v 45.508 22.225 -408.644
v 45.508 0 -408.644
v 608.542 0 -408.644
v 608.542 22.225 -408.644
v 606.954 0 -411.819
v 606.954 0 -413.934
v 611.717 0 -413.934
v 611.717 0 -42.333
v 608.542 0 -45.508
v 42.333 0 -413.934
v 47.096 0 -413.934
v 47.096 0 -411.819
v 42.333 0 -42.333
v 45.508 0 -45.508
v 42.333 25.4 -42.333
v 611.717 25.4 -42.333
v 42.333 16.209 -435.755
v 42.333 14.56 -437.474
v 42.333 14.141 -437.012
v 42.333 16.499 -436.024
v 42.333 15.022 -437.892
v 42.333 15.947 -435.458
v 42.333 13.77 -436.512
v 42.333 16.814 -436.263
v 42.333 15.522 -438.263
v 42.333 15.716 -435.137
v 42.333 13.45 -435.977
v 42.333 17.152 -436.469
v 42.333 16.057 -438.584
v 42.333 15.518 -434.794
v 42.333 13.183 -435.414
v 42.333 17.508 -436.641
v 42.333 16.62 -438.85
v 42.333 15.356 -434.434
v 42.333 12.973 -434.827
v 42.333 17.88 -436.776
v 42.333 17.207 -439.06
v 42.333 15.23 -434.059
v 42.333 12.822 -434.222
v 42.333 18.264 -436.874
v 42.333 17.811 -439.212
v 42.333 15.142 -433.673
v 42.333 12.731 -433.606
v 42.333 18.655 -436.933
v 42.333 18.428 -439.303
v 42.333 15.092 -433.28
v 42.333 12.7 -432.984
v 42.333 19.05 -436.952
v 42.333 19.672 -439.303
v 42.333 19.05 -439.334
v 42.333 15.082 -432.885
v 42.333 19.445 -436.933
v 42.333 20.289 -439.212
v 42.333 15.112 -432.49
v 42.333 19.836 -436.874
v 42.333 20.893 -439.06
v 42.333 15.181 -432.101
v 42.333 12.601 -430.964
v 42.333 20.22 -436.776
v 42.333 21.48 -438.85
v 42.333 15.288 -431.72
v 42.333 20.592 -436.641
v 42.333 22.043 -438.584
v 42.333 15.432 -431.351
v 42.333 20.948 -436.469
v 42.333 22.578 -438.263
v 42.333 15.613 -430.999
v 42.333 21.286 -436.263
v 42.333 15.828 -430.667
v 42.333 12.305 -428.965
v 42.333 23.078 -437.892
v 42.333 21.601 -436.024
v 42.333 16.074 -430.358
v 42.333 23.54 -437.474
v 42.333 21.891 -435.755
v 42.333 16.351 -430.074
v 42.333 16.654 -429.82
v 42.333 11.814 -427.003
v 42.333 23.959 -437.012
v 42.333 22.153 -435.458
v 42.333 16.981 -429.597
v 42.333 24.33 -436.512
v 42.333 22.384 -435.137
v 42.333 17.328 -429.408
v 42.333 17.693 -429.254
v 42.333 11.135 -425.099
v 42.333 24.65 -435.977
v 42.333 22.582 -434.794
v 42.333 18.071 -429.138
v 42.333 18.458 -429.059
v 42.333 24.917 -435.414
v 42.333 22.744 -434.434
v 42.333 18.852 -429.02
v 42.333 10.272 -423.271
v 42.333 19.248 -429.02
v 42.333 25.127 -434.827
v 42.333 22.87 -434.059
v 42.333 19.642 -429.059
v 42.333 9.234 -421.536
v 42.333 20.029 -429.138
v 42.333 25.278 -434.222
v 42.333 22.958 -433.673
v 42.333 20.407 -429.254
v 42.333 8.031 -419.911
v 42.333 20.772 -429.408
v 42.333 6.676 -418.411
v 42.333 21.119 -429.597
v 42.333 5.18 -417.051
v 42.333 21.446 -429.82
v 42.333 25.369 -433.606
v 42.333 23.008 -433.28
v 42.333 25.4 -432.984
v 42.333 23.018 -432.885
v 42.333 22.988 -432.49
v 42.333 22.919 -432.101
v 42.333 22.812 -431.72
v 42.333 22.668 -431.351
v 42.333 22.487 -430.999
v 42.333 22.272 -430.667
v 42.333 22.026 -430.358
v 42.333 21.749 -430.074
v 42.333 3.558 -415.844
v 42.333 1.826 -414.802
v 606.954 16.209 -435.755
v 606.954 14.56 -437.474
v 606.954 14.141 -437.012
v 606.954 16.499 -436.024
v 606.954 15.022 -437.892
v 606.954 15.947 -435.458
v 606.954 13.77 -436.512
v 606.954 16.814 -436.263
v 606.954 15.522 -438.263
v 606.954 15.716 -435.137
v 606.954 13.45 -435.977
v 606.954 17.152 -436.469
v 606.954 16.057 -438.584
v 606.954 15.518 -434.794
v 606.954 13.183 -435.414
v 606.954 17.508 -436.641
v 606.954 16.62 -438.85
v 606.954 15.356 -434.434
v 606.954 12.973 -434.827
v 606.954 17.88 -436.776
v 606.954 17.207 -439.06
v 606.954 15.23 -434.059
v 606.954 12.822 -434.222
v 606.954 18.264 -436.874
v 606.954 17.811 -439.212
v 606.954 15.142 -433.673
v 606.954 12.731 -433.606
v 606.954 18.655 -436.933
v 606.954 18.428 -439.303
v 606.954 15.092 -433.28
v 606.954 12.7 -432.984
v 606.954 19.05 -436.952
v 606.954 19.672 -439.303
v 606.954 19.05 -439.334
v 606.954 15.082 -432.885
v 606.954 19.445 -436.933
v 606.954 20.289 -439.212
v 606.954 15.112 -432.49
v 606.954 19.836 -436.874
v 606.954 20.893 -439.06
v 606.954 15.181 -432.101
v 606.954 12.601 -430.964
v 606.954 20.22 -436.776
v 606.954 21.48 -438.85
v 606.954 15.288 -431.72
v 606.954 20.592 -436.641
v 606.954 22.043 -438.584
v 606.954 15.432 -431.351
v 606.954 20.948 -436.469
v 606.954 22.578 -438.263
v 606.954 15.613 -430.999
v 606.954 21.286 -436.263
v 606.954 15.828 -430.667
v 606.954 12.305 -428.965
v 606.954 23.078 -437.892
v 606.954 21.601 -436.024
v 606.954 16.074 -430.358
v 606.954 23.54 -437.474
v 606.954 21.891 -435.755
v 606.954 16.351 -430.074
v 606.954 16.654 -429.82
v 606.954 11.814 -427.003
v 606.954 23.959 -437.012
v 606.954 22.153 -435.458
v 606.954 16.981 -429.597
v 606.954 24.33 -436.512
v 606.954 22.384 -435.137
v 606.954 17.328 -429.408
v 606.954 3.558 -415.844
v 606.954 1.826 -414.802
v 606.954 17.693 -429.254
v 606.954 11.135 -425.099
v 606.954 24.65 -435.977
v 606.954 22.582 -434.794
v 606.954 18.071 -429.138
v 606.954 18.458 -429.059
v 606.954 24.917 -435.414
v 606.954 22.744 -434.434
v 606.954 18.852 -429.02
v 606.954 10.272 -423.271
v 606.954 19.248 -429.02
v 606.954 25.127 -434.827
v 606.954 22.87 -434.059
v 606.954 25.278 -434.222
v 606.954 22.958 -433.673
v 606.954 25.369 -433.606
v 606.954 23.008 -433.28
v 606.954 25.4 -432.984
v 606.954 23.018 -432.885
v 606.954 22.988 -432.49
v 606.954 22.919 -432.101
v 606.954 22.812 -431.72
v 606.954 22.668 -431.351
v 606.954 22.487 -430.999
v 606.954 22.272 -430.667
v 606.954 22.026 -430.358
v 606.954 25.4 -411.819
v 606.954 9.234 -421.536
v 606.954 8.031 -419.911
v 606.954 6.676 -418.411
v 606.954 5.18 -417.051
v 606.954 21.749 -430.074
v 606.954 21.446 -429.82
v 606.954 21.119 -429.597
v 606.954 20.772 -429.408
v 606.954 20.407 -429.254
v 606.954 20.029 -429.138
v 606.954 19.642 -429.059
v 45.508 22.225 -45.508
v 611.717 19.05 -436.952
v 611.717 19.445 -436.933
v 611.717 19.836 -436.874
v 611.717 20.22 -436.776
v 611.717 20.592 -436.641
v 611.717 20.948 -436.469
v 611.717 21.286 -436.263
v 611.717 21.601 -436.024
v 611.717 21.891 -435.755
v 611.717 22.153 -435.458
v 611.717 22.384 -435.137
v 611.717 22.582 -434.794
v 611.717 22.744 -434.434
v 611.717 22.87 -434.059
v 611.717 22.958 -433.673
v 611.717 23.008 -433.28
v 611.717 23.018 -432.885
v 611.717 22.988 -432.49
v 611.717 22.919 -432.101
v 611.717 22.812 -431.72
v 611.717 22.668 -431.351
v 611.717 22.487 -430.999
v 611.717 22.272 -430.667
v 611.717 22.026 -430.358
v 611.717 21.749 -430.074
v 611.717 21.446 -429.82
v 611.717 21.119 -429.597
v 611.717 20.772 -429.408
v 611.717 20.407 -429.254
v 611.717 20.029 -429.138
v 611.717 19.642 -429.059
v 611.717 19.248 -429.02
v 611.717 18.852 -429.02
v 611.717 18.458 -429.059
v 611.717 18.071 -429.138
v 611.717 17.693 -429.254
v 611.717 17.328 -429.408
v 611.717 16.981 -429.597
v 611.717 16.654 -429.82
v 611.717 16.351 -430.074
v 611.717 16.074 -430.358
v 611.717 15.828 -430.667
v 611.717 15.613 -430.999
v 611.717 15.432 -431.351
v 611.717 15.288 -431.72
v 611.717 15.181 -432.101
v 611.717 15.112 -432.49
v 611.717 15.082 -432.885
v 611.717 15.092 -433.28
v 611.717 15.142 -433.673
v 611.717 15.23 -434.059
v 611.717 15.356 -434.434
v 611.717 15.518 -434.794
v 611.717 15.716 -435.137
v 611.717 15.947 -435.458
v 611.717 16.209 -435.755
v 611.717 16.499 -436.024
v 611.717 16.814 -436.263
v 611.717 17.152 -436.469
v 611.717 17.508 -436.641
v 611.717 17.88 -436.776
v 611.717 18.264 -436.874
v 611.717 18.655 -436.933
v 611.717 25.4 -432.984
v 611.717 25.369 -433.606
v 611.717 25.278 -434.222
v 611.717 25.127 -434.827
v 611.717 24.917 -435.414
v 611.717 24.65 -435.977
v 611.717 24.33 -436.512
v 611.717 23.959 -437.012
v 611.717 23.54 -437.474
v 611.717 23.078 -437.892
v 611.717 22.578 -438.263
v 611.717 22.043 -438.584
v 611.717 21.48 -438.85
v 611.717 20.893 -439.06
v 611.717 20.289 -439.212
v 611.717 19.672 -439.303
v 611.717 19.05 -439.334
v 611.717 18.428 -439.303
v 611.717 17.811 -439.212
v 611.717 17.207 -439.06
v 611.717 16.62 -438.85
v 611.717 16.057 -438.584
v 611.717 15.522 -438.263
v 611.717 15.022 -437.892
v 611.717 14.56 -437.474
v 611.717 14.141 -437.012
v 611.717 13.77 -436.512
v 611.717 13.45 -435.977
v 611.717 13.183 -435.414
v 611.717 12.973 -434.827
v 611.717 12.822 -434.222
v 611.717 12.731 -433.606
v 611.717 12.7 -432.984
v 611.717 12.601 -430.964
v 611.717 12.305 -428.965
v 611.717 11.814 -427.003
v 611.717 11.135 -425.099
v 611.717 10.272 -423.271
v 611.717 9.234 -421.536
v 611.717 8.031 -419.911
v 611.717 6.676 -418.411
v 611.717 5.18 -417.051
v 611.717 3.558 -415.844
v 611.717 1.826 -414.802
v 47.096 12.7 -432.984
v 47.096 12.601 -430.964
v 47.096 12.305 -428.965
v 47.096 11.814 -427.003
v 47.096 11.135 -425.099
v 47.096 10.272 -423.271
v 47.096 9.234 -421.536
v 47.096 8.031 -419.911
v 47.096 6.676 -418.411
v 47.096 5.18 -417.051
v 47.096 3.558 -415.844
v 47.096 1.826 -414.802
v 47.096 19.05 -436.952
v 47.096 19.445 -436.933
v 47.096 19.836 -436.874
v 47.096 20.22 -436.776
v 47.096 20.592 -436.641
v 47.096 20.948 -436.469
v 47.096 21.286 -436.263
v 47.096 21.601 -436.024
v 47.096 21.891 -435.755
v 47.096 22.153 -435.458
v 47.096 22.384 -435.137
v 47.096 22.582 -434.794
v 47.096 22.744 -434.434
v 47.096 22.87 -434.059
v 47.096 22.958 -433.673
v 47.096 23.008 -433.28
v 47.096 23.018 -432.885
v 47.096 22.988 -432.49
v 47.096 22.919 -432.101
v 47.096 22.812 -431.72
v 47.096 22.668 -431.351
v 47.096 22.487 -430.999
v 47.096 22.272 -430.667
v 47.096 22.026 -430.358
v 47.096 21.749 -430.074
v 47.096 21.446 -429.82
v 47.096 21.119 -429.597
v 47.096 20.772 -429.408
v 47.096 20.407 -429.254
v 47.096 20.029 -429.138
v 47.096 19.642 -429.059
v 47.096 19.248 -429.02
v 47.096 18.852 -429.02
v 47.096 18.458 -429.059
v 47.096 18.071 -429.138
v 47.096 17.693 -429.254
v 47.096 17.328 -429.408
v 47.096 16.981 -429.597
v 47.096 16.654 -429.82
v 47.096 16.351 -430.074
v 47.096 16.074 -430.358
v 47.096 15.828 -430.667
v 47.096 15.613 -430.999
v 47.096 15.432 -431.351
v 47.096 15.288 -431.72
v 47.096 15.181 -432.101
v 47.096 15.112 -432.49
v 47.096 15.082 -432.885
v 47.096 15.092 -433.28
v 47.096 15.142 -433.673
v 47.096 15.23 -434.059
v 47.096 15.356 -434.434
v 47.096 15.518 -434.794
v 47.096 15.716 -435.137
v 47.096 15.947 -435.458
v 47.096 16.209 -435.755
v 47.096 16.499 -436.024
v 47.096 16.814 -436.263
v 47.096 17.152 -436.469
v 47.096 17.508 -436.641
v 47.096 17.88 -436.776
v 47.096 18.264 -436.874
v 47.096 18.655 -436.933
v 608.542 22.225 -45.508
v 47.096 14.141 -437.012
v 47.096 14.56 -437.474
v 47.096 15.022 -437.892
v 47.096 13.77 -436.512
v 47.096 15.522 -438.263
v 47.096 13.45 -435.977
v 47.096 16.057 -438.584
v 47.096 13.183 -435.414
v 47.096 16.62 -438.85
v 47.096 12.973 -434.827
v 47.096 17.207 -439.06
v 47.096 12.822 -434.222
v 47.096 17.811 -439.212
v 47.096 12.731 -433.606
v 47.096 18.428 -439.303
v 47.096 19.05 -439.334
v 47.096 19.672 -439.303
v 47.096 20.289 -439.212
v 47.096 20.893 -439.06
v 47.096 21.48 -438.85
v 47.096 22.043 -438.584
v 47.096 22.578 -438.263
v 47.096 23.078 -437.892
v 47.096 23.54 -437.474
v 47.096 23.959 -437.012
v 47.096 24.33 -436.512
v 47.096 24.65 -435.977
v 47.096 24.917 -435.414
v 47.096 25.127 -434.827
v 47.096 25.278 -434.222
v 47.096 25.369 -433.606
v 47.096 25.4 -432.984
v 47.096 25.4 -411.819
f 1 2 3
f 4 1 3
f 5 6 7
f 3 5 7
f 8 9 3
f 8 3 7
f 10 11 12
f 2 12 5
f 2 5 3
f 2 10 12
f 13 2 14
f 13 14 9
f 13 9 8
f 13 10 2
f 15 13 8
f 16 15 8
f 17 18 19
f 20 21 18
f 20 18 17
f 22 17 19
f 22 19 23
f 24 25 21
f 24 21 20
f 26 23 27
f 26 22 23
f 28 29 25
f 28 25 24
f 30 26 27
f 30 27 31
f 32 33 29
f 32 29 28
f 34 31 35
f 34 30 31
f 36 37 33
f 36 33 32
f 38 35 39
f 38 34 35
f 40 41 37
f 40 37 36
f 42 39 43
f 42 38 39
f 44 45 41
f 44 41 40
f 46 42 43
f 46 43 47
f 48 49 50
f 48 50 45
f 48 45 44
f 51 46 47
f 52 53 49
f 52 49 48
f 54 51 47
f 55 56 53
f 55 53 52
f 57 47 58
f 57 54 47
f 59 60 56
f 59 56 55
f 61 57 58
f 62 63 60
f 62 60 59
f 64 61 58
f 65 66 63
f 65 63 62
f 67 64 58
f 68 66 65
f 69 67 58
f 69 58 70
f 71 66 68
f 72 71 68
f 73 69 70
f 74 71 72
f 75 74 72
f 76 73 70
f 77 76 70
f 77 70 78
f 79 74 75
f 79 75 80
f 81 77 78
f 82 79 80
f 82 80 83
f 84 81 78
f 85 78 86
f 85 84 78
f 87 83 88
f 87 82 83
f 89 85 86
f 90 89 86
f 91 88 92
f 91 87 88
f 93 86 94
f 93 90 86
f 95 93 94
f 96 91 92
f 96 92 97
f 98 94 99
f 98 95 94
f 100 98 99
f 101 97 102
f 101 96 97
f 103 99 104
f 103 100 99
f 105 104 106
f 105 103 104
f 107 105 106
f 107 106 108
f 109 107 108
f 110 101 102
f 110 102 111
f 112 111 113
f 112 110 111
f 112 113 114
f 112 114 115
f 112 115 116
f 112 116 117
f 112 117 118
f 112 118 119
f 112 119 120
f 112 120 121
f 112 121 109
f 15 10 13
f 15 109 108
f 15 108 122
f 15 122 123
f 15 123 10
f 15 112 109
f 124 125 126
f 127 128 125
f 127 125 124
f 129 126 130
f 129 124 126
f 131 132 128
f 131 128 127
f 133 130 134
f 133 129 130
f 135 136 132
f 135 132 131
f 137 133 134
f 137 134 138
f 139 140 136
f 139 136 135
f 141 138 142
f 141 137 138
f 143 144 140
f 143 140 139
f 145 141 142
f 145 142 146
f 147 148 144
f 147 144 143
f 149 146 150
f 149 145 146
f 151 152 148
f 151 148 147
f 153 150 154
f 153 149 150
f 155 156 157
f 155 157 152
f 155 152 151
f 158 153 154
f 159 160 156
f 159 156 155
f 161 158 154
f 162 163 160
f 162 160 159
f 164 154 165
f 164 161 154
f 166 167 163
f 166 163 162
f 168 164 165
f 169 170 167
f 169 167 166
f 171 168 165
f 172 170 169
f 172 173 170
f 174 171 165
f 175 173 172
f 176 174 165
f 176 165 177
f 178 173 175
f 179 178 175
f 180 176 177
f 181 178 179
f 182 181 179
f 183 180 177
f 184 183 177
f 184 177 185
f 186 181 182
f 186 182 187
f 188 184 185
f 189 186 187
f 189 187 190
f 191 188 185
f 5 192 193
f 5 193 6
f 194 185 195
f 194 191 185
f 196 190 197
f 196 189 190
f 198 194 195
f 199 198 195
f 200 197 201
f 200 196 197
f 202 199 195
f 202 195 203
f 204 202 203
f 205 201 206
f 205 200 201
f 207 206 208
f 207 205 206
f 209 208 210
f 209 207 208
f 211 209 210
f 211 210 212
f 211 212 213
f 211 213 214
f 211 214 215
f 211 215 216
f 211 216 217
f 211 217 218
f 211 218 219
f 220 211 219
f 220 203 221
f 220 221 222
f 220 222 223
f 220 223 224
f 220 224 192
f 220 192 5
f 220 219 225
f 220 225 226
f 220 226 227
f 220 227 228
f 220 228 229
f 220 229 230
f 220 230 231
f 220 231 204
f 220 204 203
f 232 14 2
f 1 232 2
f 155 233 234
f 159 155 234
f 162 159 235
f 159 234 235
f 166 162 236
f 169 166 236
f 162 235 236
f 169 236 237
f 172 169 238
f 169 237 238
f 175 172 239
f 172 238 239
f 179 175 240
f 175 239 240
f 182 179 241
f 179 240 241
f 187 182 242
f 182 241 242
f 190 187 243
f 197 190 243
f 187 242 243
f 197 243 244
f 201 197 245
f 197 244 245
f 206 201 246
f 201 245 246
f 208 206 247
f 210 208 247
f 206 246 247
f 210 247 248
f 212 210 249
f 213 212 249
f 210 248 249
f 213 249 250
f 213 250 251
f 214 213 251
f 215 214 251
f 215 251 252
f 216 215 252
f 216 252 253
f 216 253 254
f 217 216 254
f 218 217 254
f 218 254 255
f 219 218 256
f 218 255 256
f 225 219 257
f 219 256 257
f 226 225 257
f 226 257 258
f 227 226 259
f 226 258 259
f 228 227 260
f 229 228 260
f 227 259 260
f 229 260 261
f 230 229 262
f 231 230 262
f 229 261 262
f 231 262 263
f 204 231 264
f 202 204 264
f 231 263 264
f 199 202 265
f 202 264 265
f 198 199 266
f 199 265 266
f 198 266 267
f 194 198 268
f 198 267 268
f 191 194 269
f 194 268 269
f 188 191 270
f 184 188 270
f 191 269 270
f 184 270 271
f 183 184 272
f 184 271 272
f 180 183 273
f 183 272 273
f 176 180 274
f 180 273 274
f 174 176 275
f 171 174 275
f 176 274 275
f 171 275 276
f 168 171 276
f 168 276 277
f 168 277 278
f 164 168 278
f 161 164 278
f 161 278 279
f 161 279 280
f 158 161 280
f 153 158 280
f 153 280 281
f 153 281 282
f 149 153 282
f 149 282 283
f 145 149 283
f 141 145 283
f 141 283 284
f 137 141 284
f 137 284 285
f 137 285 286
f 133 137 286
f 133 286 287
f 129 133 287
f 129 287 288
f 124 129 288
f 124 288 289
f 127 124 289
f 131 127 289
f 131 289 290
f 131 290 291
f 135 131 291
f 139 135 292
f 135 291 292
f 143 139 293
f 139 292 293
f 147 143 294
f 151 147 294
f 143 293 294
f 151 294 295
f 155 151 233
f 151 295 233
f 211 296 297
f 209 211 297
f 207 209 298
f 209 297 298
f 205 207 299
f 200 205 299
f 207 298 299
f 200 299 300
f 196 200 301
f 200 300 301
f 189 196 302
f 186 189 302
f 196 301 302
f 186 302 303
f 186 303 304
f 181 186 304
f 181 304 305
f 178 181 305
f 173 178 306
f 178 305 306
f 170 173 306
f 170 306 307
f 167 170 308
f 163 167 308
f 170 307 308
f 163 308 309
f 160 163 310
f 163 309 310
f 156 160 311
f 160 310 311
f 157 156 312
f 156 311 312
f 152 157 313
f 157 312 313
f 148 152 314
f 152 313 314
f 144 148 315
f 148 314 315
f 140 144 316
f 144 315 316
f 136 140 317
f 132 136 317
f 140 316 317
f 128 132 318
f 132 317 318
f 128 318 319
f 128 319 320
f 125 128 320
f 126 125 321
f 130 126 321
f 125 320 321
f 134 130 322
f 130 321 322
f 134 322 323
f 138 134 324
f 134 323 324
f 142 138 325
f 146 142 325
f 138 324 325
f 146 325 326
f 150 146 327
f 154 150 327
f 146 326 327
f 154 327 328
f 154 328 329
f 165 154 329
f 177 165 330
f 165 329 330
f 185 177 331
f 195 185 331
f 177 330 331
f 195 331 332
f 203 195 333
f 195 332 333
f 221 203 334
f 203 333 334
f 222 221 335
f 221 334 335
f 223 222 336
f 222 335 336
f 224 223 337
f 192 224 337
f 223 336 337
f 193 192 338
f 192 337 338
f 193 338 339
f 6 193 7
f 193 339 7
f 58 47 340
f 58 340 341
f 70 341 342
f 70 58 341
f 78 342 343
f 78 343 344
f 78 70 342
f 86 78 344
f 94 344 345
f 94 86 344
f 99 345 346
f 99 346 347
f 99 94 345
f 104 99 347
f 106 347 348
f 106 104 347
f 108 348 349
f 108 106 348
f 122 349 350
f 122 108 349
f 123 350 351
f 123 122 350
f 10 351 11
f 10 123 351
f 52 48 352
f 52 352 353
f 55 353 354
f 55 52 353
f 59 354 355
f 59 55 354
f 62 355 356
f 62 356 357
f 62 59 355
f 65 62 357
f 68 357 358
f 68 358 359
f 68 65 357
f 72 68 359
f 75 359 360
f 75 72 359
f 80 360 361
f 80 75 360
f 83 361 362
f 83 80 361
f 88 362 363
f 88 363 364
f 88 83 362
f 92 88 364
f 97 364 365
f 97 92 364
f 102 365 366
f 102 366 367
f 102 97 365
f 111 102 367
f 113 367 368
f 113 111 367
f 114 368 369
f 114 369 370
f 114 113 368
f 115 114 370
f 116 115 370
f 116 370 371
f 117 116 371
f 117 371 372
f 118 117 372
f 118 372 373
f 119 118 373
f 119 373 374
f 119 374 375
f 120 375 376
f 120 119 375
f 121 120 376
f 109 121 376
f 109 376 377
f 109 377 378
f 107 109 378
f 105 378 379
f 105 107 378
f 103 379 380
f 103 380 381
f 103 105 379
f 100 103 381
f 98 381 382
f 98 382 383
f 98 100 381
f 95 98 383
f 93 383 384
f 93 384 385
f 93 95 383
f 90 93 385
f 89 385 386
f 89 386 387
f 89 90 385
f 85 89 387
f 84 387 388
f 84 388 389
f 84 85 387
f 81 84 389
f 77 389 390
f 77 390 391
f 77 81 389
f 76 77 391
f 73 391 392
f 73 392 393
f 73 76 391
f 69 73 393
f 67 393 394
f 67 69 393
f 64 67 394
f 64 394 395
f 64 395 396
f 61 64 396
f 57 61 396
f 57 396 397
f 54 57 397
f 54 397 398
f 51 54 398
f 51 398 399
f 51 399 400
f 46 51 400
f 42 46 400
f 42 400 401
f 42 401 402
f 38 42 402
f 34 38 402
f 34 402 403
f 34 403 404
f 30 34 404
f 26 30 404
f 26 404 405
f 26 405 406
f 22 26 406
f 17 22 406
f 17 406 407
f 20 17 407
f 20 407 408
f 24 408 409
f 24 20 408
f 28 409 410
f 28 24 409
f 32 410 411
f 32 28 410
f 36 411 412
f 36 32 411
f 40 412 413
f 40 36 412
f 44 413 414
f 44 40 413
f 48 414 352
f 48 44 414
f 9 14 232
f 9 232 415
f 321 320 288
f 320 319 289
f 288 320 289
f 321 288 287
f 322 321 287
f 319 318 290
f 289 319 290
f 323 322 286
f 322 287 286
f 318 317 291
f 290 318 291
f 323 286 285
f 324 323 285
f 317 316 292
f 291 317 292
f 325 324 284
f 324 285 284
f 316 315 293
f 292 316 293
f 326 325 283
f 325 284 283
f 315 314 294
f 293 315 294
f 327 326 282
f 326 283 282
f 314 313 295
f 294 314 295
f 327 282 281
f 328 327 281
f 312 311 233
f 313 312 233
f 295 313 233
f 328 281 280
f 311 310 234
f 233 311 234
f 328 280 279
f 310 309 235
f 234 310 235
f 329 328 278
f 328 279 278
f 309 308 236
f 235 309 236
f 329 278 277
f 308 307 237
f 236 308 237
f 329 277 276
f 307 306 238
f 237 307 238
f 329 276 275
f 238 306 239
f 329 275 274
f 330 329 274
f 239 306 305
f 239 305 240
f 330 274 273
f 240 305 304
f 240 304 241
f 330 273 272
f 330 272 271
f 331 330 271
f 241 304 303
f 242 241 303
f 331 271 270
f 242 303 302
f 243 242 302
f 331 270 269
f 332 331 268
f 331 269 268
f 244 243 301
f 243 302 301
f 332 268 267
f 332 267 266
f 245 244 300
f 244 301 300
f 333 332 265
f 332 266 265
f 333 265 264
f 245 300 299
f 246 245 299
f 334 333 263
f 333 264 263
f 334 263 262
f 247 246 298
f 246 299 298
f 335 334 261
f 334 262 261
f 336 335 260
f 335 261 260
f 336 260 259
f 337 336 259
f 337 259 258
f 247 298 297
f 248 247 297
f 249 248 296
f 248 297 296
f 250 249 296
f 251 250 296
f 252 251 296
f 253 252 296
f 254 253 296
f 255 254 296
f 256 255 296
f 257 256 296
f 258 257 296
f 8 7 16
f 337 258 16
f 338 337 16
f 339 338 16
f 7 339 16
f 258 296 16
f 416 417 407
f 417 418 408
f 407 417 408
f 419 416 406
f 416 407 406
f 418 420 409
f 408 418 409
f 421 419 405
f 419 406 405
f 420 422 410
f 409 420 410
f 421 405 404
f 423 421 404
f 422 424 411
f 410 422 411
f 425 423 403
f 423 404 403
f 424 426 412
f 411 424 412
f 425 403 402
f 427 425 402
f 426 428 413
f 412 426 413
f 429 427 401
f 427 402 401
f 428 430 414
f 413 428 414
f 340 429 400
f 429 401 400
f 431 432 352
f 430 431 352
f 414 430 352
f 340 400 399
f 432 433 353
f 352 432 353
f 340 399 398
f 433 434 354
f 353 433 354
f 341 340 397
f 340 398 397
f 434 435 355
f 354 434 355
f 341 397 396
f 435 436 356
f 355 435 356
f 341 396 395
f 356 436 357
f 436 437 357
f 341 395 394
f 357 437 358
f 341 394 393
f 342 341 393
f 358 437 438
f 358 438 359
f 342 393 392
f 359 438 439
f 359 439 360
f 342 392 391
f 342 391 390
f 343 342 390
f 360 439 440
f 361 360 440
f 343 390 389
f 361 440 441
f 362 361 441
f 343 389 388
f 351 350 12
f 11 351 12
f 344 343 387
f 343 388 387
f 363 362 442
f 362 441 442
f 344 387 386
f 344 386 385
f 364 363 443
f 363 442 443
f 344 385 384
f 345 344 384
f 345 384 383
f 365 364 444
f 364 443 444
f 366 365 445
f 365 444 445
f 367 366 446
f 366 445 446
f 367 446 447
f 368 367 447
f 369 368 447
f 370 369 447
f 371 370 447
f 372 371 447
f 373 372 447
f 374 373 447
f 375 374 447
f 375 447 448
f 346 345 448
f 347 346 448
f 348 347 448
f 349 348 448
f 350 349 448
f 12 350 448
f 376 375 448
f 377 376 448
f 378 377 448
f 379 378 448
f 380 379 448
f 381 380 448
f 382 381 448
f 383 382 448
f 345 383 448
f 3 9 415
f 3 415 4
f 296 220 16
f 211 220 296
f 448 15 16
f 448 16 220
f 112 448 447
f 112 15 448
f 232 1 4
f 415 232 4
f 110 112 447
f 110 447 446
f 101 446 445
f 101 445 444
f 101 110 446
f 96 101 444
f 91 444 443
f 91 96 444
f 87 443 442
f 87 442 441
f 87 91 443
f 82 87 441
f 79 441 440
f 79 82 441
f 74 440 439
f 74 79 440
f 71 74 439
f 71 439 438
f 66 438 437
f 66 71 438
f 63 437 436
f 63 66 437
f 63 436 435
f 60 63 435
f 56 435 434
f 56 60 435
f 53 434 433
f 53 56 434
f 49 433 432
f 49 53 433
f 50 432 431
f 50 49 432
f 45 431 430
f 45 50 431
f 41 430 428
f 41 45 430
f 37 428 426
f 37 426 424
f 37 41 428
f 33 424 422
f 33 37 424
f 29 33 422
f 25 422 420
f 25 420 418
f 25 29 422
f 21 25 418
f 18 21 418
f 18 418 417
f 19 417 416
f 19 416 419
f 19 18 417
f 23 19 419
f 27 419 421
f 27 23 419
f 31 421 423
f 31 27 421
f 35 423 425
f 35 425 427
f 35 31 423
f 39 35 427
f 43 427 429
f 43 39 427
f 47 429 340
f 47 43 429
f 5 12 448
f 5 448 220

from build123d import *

# Parameters (mm, degrees)
CROQUIS1_W              = 569.383333334
CROQUIS1_H              = 369.485333334
SALIENTE_EXTRUIR1_DEPTH = 25.4
VACIADO1_T              = -3.175
CROQUIS2_R              = 3.96875
SALIENTE_EXTRUIR2_DEPTH = 4.7625


with BuildPart() as part:
    # Croquis1 → Saliente-Extruir1 (new body)
    with BuildSketch(Plane(origin=(0, 0, 0), x_dir=(1, 0, 0), z_dir=(0, 1, 0))):
        with Locations((327.025, 227.076)):
            Rectangle(CROQUIS1_W, CROQUIS1_H)
    extrude(amount=SALIENTE_EXTRUIR1_DEPTH)

    # Vaciado1
    vaciado1_openings = [part.faces().sort_by_distance(p)[0] for p in [
        (327.025, 0, -227.076),
    ]]
    offset(amount=VACIADO1_T, openings=vaciado1_openings, kind=Kind.INTERSECTION)

    # Croquis2 → Saliente-Extruir2 (add)
    with BuildSketch(Plane(origin=(611.716666667, 0, 0), x_dir=(0, 0, -1), z_dir=(1, 0, 0))):
        with BuildLine():
            Line((411.818666667, 0), (411.818666667, 25.4))
            Line((411.818666667, 25.4), (432.983666667, 25.4))
            ThreePointArc((432.983666667, 25.4), (439.333666667, 19.05), (432.983666667, 12.7))
            ThreePointArc((432.983666667, 12.7), (421.536041367, 9.233937949), (413.933666667, 0))
            Line((413.933666667, 0), (411.818666667, 0))
        make_face()
        with Locations((432.983666667, 19.05)):
            Circle(CROQUIS2_R, mode=Mode.SUBTRACT)
    saliente_extruir2 = extrude(amount=-SALIENTE_EXTRUIR2_DEPTH)

    # Simetría1: Saliente-Extruir2 across plane
    add(saliente_extruir2.mirror(Plane(origin=(327.025, 0, 0), x_dir=(0, 0, 1), z_dir=(1, 0, 0))))


solid = part.part
